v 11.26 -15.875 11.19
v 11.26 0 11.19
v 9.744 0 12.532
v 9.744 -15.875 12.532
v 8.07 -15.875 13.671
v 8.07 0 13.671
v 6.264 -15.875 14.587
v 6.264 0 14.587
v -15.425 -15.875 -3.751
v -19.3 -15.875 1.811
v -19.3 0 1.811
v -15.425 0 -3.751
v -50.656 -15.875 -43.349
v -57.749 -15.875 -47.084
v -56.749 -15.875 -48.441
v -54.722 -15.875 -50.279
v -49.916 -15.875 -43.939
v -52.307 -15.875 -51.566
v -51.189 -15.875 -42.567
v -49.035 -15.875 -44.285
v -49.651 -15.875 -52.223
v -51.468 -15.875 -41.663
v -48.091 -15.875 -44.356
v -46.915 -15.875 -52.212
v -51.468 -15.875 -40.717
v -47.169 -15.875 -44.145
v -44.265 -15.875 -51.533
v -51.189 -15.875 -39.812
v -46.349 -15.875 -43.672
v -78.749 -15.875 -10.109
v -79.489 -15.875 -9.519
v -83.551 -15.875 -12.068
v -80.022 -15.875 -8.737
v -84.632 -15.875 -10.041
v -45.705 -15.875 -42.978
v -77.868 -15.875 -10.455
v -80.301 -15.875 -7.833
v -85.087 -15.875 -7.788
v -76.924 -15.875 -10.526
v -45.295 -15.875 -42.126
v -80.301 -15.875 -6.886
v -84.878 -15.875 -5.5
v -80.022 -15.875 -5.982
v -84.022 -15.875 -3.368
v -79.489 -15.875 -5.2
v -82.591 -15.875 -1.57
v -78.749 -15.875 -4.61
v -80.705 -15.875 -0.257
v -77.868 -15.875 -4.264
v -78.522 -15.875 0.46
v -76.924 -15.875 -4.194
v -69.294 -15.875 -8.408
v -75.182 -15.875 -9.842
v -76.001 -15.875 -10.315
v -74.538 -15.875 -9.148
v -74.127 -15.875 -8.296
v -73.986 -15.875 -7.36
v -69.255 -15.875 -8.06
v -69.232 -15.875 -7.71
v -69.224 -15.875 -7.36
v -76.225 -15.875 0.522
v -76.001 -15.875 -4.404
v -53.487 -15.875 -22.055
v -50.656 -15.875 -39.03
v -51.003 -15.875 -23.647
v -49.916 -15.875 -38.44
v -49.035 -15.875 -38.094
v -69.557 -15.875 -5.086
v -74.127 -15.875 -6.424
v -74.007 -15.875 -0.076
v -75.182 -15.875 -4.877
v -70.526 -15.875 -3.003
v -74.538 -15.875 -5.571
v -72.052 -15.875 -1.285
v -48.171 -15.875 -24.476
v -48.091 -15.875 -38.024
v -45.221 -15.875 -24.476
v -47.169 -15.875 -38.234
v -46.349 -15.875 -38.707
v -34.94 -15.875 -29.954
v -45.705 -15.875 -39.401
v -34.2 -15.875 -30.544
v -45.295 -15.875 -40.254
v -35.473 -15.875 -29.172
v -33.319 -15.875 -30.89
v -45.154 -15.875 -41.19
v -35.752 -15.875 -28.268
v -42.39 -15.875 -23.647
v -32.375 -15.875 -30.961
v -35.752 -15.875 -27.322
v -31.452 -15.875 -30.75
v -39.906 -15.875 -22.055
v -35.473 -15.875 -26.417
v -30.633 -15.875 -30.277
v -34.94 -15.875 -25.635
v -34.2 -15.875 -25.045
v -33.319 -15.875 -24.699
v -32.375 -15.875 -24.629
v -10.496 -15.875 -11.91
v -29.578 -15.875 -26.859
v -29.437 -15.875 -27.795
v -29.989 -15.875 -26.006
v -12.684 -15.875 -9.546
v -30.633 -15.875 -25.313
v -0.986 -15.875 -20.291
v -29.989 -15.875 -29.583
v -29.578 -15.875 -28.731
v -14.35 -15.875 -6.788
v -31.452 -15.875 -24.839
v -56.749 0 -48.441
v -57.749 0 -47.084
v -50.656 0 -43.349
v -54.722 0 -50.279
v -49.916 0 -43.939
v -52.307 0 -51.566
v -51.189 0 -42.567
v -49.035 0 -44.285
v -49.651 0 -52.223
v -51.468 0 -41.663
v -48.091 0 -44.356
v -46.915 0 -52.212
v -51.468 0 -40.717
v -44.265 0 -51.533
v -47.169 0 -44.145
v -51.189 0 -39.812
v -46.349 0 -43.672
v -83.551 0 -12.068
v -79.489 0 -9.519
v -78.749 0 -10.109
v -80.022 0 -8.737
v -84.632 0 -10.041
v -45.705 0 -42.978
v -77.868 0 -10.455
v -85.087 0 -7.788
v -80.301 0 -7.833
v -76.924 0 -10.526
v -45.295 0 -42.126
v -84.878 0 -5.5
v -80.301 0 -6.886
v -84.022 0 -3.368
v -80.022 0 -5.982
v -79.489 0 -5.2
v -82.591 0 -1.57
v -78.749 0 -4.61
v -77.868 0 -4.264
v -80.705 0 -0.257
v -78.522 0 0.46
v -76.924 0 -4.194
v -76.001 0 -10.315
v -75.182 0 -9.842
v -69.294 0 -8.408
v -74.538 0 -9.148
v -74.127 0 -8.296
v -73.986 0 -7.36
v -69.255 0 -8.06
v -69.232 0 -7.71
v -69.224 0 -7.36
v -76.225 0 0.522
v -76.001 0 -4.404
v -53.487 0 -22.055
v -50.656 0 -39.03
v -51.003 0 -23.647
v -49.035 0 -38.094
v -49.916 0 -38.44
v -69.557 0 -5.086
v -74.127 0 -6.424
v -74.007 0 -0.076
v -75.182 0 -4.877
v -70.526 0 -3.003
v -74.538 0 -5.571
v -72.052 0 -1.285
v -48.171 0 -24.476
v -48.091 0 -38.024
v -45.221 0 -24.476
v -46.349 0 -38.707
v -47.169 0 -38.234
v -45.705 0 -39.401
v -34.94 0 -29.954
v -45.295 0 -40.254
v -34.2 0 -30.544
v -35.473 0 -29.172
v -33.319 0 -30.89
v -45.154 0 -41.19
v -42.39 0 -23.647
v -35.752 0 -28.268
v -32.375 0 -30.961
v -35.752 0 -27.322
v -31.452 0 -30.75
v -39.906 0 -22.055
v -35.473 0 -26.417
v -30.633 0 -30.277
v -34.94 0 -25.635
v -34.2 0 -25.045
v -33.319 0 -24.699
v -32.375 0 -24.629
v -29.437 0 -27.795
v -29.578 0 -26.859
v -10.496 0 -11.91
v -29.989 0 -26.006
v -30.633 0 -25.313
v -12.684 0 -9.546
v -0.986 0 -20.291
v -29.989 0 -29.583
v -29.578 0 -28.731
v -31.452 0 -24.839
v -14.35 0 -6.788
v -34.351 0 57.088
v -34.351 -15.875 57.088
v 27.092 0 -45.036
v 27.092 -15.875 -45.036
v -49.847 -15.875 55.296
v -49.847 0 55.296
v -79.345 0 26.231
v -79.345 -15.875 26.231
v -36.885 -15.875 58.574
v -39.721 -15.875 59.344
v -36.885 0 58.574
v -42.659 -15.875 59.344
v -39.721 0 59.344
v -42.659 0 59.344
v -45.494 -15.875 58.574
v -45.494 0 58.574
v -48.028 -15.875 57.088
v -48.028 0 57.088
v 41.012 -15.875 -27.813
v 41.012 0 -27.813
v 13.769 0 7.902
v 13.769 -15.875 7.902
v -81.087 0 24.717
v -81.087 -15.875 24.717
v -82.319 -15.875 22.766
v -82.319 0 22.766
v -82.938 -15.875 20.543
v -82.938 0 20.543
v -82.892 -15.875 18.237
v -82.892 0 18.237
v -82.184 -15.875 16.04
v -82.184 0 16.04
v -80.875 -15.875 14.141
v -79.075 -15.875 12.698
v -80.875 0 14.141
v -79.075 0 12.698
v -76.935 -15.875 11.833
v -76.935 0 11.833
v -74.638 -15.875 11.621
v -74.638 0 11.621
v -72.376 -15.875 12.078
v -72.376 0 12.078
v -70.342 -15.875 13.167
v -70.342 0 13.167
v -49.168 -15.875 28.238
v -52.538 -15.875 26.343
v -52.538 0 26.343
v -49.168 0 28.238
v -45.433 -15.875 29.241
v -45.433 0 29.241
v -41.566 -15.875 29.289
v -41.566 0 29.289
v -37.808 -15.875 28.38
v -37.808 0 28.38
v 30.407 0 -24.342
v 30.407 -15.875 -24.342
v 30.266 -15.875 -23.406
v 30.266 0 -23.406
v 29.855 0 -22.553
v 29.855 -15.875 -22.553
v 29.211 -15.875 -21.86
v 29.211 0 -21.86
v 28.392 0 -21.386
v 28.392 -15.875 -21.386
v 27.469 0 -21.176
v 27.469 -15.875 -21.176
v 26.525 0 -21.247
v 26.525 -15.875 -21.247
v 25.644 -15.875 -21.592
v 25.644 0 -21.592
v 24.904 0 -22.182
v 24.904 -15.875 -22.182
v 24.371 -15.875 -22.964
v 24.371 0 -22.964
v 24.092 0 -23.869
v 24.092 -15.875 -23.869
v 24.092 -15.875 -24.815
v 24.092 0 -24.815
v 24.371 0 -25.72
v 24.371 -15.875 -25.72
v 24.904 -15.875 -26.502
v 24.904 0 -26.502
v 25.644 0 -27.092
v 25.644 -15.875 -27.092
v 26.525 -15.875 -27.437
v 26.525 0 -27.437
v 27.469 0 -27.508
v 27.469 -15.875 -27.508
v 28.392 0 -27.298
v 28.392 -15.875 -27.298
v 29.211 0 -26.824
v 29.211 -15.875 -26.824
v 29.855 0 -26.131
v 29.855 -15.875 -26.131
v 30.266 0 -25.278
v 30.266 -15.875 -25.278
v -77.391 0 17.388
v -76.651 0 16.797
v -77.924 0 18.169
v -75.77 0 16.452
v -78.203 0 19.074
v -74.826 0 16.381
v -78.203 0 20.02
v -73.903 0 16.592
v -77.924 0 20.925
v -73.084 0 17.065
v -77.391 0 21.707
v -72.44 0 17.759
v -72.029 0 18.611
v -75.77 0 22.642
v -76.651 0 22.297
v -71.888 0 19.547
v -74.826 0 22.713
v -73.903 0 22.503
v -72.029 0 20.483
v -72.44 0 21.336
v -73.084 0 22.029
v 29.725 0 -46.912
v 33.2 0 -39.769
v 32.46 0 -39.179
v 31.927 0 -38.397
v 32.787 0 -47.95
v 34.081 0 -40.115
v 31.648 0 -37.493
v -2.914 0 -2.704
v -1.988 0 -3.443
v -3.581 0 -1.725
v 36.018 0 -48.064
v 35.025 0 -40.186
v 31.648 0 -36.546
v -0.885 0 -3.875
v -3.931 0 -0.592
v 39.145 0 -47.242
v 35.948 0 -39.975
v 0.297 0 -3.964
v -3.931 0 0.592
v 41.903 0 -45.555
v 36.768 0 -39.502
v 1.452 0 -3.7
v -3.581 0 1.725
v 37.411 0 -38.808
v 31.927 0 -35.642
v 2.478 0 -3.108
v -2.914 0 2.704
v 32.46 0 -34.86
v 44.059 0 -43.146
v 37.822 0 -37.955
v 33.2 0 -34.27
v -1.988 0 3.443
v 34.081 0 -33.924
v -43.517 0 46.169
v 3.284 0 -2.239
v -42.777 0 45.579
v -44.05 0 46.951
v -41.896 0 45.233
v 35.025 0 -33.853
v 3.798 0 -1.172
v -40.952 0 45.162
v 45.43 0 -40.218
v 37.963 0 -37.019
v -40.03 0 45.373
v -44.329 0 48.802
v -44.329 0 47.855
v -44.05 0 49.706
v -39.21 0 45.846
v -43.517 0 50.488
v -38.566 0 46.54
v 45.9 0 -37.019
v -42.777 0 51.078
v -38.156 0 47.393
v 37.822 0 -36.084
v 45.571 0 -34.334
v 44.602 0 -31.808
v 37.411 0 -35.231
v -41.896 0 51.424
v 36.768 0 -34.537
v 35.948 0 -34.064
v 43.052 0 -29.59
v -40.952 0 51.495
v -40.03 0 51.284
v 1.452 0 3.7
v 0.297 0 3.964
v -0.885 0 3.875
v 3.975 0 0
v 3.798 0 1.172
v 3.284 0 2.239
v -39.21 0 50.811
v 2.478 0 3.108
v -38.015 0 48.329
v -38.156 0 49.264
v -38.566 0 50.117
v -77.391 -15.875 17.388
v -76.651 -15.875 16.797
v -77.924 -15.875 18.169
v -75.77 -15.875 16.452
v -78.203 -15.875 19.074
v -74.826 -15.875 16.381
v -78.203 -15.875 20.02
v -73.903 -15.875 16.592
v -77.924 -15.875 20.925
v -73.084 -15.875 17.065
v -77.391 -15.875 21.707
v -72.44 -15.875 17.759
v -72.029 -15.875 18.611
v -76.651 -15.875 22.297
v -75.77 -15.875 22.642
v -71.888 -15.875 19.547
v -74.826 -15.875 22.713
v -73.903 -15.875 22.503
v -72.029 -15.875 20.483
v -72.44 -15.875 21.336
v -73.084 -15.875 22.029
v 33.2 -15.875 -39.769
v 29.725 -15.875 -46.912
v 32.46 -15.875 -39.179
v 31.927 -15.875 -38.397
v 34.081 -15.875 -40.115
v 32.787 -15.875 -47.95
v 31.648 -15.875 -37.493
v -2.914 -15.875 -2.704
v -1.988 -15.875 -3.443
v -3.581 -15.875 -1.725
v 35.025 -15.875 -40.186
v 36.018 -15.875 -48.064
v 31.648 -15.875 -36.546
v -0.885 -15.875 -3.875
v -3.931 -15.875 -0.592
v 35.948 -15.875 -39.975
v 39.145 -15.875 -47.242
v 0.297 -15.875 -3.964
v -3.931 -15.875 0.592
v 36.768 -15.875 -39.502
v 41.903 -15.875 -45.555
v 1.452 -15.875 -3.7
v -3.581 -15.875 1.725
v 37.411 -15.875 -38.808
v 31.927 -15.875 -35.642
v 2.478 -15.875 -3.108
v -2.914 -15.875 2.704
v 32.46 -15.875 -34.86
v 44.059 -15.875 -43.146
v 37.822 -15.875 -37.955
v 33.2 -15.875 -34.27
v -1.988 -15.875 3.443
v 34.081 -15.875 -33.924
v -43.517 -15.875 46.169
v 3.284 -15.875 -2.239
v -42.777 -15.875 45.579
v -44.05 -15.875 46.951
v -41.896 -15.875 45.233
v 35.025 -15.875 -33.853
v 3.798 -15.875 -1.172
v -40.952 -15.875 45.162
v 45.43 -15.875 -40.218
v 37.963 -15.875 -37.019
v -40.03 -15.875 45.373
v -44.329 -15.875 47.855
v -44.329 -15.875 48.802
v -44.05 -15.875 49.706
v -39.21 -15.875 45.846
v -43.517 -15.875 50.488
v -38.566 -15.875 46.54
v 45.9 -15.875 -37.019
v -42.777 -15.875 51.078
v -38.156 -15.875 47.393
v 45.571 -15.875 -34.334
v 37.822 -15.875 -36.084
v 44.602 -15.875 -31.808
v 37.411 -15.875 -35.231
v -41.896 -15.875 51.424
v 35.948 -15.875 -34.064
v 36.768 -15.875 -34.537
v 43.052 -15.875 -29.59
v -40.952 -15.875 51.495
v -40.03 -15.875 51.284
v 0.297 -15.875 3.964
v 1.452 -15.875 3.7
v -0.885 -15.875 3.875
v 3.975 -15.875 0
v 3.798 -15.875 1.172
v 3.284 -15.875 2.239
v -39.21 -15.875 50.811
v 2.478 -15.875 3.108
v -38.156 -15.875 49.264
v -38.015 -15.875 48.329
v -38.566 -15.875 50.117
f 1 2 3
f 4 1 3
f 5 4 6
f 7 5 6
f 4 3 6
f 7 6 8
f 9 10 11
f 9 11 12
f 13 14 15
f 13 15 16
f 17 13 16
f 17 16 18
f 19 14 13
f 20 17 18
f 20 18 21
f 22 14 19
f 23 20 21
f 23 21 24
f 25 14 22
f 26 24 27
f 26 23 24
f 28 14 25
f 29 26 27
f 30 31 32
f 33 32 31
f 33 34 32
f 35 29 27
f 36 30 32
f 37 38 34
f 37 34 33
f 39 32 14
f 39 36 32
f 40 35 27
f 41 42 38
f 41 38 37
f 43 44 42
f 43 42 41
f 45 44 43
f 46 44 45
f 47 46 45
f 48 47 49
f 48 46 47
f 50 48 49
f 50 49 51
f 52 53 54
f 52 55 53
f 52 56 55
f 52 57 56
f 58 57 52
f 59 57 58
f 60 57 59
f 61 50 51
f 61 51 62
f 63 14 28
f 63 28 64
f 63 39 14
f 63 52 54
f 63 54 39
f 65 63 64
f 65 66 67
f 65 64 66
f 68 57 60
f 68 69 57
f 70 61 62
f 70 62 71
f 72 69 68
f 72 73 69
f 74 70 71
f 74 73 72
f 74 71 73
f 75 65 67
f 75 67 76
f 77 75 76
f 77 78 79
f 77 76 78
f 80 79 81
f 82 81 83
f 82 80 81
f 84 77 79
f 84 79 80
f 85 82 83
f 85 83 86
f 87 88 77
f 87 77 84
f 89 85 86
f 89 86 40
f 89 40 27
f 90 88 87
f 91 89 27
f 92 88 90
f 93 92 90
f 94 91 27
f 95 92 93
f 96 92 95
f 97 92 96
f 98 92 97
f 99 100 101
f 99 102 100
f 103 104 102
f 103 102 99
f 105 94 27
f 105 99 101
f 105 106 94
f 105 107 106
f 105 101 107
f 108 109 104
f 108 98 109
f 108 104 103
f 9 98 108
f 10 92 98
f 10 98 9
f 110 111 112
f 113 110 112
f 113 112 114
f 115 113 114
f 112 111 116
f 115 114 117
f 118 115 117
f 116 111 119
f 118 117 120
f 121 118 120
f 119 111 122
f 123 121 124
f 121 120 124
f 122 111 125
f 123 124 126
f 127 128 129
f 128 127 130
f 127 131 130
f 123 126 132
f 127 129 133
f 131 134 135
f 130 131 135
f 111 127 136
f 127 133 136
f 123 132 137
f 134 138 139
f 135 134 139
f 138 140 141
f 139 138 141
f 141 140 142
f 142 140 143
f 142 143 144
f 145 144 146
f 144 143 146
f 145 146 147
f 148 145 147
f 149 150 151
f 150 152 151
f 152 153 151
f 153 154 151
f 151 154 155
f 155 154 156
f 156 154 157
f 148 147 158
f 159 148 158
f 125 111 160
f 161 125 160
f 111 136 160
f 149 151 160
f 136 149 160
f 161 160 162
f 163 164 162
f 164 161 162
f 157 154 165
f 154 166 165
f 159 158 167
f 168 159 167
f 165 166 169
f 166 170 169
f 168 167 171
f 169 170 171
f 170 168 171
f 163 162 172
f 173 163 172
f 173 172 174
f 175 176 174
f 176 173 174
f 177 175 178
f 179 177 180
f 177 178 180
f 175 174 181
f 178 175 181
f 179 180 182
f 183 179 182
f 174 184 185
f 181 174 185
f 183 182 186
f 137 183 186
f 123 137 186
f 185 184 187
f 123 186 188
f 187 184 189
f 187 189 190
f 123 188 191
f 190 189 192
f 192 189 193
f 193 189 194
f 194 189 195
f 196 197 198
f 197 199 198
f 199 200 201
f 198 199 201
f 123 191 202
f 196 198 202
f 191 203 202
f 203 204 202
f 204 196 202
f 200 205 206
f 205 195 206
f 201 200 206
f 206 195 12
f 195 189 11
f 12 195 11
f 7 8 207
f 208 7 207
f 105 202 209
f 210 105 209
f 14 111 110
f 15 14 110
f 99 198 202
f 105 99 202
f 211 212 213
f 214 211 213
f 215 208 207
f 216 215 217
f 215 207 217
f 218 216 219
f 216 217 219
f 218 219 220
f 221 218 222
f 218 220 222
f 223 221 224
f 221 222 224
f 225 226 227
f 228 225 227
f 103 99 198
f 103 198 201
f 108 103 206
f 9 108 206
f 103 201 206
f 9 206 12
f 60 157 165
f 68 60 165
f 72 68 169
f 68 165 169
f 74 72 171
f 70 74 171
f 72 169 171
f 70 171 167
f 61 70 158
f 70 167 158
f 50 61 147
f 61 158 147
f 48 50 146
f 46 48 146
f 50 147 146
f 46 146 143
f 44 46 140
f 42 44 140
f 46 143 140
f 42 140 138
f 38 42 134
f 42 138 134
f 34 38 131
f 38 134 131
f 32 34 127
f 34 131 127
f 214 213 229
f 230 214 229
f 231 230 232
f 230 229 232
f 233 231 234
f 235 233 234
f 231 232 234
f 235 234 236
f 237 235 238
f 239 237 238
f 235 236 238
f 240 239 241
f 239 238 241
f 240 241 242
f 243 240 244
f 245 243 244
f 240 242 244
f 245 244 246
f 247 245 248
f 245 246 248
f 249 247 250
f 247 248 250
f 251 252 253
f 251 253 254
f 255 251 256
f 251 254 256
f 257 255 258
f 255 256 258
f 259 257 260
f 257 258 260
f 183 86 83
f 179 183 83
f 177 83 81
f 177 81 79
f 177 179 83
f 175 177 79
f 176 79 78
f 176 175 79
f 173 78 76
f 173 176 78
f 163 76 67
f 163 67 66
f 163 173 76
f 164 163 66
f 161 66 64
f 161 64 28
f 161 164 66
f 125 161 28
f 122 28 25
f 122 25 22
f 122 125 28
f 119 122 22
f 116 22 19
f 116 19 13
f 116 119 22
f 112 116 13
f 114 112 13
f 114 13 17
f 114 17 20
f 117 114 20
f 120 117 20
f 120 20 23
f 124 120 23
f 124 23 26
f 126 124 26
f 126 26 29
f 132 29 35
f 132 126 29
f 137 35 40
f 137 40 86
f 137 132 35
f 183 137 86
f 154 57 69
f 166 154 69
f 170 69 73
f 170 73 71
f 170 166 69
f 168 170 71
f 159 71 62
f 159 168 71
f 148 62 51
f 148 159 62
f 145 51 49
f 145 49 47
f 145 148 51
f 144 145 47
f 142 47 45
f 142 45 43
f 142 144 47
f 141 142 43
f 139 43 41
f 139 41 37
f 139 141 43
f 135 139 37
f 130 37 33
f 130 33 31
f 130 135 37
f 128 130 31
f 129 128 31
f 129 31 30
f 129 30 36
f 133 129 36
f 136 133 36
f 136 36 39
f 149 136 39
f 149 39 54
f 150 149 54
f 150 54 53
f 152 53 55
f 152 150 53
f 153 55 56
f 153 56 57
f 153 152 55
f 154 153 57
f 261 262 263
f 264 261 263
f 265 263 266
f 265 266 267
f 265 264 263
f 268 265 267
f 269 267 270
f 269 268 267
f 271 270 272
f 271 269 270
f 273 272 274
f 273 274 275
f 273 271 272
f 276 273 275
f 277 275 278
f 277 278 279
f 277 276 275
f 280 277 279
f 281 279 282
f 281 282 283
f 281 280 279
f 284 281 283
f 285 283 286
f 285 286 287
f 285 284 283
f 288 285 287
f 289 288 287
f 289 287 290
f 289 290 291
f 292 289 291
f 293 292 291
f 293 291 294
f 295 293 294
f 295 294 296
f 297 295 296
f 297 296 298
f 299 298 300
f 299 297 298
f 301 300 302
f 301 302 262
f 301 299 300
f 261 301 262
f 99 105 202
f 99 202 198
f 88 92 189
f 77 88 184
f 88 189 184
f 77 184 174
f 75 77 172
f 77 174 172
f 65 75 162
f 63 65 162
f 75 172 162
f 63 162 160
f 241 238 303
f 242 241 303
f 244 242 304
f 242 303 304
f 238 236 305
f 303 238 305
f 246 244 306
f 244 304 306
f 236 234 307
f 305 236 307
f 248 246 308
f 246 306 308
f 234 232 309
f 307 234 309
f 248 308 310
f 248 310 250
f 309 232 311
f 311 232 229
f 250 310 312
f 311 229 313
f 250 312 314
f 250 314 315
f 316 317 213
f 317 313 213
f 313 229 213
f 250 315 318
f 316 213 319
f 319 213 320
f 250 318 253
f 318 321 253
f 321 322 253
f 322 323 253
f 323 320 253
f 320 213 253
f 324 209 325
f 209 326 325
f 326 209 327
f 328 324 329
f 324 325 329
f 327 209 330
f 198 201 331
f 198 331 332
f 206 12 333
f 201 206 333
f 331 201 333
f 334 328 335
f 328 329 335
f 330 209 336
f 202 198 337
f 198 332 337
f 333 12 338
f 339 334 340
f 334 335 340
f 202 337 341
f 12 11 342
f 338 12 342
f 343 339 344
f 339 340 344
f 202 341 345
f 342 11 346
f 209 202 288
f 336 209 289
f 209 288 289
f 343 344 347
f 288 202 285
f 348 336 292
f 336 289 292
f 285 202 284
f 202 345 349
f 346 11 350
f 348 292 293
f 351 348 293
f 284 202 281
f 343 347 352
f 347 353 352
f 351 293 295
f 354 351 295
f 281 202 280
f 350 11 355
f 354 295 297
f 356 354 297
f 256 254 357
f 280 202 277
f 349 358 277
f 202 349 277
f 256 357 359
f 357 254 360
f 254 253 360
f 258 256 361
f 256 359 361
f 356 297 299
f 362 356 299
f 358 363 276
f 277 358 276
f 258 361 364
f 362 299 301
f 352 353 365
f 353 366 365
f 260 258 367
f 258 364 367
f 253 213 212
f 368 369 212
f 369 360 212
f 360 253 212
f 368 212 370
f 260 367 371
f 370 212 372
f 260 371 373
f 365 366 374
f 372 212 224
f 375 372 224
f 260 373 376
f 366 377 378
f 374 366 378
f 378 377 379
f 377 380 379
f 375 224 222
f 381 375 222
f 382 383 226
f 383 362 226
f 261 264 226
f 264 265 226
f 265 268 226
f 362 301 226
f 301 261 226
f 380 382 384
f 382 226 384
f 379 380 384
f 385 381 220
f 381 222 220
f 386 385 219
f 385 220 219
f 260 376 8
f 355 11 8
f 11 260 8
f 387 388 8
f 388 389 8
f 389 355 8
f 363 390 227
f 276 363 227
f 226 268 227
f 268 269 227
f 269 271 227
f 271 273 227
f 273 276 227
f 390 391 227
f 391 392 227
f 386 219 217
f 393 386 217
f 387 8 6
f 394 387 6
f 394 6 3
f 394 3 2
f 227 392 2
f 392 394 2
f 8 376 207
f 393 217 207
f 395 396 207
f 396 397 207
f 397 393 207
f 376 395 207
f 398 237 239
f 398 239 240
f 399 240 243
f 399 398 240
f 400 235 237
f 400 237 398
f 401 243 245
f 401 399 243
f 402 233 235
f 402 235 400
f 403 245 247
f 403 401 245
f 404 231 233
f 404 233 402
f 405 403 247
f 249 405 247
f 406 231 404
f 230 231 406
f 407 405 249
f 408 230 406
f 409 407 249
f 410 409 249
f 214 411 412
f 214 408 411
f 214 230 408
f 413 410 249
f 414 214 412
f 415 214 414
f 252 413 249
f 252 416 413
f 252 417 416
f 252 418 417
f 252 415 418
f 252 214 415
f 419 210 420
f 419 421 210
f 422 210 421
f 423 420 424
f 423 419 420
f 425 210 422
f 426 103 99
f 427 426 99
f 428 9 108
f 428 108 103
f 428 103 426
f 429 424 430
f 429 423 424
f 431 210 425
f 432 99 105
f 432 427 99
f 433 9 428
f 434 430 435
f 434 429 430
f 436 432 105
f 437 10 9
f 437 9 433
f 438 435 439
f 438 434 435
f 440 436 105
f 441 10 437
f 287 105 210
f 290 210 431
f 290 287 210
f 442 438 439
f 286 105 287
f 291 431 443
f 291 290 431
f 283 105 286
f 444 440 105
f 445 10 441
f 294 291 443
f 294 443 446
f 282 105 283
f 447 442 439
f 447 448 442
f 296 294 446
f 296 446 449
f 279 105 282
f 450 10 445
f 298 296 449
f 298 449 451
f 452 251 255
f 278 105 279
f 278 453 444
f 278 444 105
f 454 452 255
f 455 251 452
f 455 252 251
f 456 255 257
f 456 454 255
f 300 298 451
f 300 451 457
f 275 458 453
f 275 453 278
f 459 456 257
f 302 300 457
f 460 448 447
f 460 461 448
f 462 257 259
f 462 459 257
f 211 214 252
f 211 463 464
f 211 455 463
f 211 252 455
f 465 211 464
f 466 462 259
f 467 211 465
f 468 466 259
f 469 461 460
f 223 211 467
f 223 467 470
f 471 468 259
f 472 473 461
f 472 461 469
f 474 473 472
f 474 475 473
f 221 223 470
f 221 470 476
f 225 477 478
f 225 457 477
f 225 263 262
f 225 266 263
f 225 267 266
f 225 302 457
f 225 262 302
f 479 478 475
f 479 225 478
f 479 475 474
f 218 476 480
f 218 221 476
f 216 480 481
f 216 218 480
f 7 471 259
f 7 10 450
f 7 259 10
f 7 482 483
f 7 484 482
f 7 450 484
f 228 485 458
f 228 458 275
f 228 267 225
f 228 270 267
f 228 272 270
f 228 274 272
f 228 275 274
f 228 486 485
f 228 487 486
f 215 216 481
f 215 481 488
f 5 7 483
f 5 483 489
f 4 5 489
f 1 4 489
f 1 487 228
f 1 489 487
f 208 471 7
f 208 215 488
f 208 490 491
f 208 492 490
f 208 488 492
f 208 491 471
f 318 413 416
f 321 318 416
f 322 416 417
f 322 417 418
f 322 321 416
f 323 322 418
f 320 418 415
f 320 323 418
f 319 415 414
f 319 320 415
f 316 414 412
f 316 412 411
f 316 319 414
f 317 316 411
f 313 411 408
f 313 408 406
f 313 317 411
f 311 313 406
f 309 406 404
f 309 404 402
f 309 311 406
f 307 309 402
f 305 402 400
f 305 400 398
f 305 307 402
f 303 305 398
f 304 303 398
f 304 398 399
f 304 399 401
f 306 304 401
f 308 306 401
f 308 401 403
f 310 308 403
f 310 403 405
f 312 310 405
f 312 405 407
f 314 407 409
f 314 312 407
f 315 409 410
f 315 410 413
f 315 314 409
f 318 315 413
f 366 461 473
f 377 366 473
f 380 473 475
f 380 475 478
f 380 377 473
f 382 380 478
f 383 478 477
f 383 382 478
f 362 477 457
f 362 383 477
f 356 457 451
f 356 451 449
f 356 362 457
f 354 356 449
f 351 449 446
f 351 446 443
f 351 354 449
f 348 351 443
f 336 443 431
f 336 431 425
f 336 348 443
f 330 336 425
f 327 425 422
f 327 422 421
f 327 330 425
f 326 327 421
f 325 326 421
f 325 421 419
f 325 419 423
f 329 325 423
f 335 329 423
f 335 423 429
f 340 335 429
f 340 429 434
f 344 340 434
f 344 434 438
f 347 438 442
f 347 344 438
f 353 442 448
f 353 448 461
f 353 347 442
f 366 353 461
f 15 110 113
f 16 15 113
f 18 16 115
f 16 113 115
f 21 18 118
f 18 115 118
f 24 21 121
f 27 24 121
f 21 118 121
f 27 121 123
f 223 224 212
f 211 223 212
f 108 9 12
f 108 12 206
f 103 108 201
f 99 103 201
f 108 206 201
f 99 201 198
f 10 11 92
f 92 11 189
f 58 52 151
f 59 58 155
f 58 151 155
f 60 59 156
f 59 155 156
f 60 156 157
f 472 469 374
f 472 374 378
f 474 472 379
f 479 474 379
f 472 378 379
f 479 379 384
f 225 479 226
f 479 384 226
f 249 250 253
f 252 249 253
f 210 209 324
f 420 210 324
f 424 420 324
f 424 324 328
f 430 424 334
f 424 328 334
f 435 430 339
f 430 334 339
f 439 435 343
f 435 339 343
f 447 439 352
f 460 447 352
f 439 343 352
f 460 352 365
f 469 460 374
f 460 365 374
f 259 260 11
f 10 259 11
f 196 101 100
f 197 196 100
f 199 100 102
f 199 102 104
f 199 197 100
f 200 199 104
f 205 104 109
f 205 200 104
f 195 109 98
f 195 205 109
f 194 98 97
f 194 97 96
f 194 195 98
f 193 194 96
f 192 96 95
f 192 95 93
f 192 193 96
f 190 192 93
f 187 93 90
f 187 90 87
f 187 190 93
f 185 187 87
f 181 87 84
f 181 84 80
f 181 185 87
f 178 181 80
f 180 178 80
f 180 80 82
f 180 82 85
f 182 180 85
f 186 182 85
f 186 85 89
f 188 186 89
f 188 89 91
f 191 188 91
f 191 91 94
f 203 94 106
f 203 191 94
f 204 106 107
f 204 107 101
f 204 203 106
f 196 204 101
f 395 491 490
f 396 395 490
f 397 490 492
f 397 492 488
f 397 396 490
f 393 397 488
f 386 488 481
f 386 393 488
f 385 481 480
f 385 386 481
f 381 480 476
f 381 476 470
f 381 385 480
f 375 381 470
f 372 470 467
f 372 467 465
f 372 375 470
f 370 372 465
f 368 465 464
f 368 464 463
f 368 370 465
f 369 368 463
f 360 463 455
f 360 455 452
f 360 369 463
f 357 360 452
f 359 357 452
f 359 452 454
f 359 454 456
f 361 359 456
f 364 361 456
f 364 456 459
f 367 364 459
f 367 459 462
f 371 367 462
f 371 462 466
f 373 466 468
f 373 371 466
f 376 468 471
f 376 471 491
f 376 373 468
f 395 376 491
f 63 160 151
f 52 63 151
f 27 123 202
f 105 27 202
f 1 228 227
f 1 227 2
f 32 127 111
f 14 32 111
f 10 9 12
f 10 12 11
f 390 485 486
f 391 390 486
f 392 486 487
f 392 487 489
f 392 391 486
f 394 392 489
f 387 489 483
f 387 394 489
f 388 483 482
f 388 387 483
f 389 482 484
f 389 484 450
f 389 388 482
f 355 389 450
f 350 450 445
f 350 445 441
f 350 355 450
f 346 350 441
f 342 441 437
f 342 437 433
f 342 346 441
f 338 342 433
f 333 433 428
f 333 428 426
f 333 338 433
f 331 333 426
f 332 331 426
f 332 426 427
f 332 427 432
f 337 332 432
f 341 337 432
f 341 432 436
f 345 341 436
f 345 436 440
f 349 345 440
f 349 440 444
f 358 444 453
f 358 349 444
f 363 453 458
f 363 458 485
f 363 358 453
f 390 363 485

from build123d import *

# Parameters (mm, degrees)
F0_R     = 3.175
F1_DEPTH = 15.875
F0_R_2   = 3.9751
F2_DEPTH = 15.875


with BuildPart() as f1:
    # F0 (on Front) → F1 (new body)
    with BuildSketch(Plane.XZ):
        with BuildLine():
            ThreePointArc((-10.4960732024, -11.9099988383), (-13.5875737276, -8.2093523008), (-15.4254200703, -3.7512718716))
            Line((-15.4254200703, -3.7512718716), (-19.3001614593, 1.8110578452))
            Line((-19.3001614593, 1.8110578452), (-39.9055071175, -22.0553158222))
            ThreePointArc((-39.9055071175, -22.0553158222), (-46.6961157411, -24.5811329447), (-53.4867243648, -22.0553158222))
            Line((-53.4867243648, -22.0553158222), (-69.2935079295, -8.4083226244))
            ThreePointArc((-69.2935079295, -8.4083226244), (-75.1878468749, -15.0479298343), (-83.5514512466, -12.0683766096))
            Line((-83.5514512466, -12.0683766096), (-57.7488667293, -47.0843634166))
            ThreePointArc((-57.7488667293, -47.0843634166), (-51.3949849127, -30.5086752982), (-37.2161209875, -41.1897365062))
            ThreePointArc((-37.2161209875, -41.1897365062), (-37.8797093639, -44.9723152736), (-39.7912214837, -48.3031369562))
            Line((-39.7912214837, -48.3031369562), (-0.9861432884, -20.2909336763))
            Line((-0.9861432884, -20.2909336763), (-10.4960732024, -11.9099988383))
        make_face()
        with Locations((-32.6121534423, -27.7948341944)):
            Circle(F0_R, mode=Mode.SUBTRACT)
        with BuildLine():
            ThreePointArc((-83.5514512466, -12.0683766096), (-75.1878468749, -15.0479298343), (-69.2935079295, -8.4083226244))
            ThreePointArc((-69.2935079295, -8.4083226244), (-69.2413484864, -7.8851648917), (-69.2239365418, -7.359701815))
            ThreePointArc((-69.2239365418, -7.359701815), (-79.639658135, 0.1810092911), (-83.5514512466, -12.0683766096))
        make_face()
        with Locations((-77.1614365418, -7.359701815)):
            Circle(F0_R, mode=Mode.SUBTRACT)
        with BuildLine():
            Line((-44.2649080783, -51.5325549635), (-39.7912214837, -48.3031369562))
            ThreePointArc((-39.7912214837, -48.3031369562), (-37.8797093639, -44.9723152736), (-37.2161209875, -41.1897365062))
            ThreePointArc((-37.2161209875, -41.1897365062), (-51.3949849127, -30.5086752982), (-57.7488667293, -47.0843634166))
            Line((-57.7488667293, -47.0843634166), (-56.7488778009, -48.4414212377))
            ThreePointArc((-56.7488778009, -48.4414212377), (-50.9995095335, -51.9764881314), (-44.2649080783, -51.5325549635))
        make_face()
        with Locations((-48.3286209875, -41.1897365062)):
            Circle(F0_R, mode=Mode.SUBTRACT)
    extrude(amount=F1_DEPTH)


with BuildPart() as f2:
    # F0 (on Front) → F2 (new body)
    with BuildSketch(Plane.XZ):
        with BuildLine():
            ThreePointArc((-15.4254200703, -3.7512718716), (-15.601870238, 2.9321101749), (-13.0110959964, 9.0954387455))
            Line((-13.0110959964, 9.0954387455), (-19.3001614593, 1.8110578452))
            Line((-19.3001614593, 1.8110578452), (-15.4254200703, -3.7512718716))
        make_face()
        with BuildLine():
            Line((13.7687512281, 7.9017159288), (11.2603527656, 11.1901778625))
            ThreePointArc((11.2603527656, 11.1901778625), (8.9252814501, 13.1284034078), (6.2640582022, 14.5868845145))
            ThreePointArc((6.2640582022, 14.5868845145), (-4.3496694021, 15.267481819), (-13.0110959964, 9.0954387455))
            ThreePointArc((-13.0110959964, 9.0954387455), (-15.601870238, 2.9321101749), (-15.4254200703, -3.7512718716))
            ThreePointArc((-15.4254200703, -3.7512718716), (-13.5875737276, -8.2093523008), (-10.4960732024, -11.9099988383))
            ThreePointArc((-10.4960732024, -11.9099988383), (-0.7706182381, -15.8562849536), (9.2916789078, -12.8716870718))
            ThreePointArc((9.2916789078, -12.8716870718), (14.1336659728, -7.2287696858), (15.875, 0))
            ThreePointArc((15.875, 0), (15.3394027059, 4.0888078491), (13.7687512281, 7.9017159288))
        make_face()
        Circle(F0_R_2, mode=Mode.SUBTRACT)
        with BuildLine():
            Line((41.0118364793, -27.8134426259), (13.7687512281, 7.9017159288))
            ThreePointArc((13.7687512281, 7.9017159288), (15.3394027059, 4.0888078491), (15.875, 0))
            ThreePointArc((15.875, 0), (14.1336659728, -7.2287696858), (9.2916789078, -12.8716870718))
            Line((9.2916789078, -12.8716870718), (-0.9861432884, -20.2909336763))
            Line((-0.9861432884, -20.2909336763), (27.0920340306, -45.0357400635))
            ThreePointArc((27.0920340306, -45.0357400635), (26.1453854478, -30.0341773035), (41.0118364793, -27.8134426259))
        make_face()
        with Locations((27.231558522, -24.3419895552)):
            Circle(F0_R, mode=Mode.SUBTRACT)
        with BuildLine():
            Line((-0.9861432884, -20.2909336763), (9.2916789078, -12.8716870718))
            ThreePointArc((9.2916789078, -12.8716870718), (-0.7706182381, -15.8562849536), (-10.4960732024, -11.9099988383))
            Line((-10.4960732024, -11.9099988383), (-0.9861432884, -20.2909336763))
        make_face()
        with BuildLine():
            ThreePointArc((-13.0110959964, 9.0954387455), (-4.3496694021, 15.267481819), (6.2640582022, 14.5868845145))
            Line((6.2640582022, 14.5868845145), (-32.129608296, 54.7630388372))
            ThreePointArc((-32.129608296, 54.7630388372), (-30.6027555629, 51.7055264877), (-30.0772365062, 48.3286209875))
            ThreePointArc((-30.0772365062, 48.3286209875), (-44.8835040281, 37.847984664), (-49.8466381249, 55.2960961839))
            Line((-49.8466381249, 55.2960961839), (-79.3452021815, 26.2306461132))
            ThreePointArc((-79.3452021815, 26.2306461132), (-71.254391912, 26.5109371005), (-67.1259022204, 19.5470770559))
            ThreePointArc((-67.1259022204, 19.5470770559), (-67.975255956, 15.9746704742), (-70.3415466386, 13.1667960186))
            Line((-70.3415466386, 13.1667960186), (-52.5381806367, 26.3425358707))
            ThreePointArc((-52.5381806367, 26.3425358707), (-45.4329874517, 29.2405119956), (-37.8079637885, 28.379669413))
            Line((-37.8079637885, 28.379669413), (-19.3001614593, 1.8110578452))
            Line((-19.3001614593, 1.8110578452), (-13.0110959964, 9.0954387455))
        make_face()
        with BuildLine():
            ThreePointArc((-30.0772365062, 48.3286209875), (-30.6027555629, 51.7055264877), (-32.129608296, 54.7630388372))
            Line((-32.129608296, 54.7630388372), (-34.3510617896, 57.0876268883))
            ThreePointArc((-34.3510617896, 57.0876268883), (-41.1897365062, 59.4411209875), (-48.0284112228, 57.0876268883))
            Line((-48.0284112228, 57.0876268883), (-49.8466381249, 55.2960961839))
            ThreePointArc((-49.8466381249, 55.2960961839), (-44.8835040281, 37.847984664), (-30.0772365062, 48.3286209875))
        make_face()
        with Locations((-41.1897365062, 48.3286209875)):
            Circle(F0_R, mode=Mode.SUBTRACT)
        with BuildLine():
            ThreePointArc((-67.1259022204, 19.5470770559), (-71.254391912, 26.5109371005), (-79.3452021815, 26.2306461132))
            ThreePointArc((-79.3452021815, 26.2306461132), (-81.599032034, 15.0426959453), (-70.3415466386, 13.1667960186))
            ThreePointArc((-70.3415466386, 13.1667960186), (-67.975255956, 15.9746704742), (-67.1259022204, 19.5470770559))
        make_face()
        with Locations((-75.0634022204, 19.5470770559)):
            Circle(F0_R, mode=Mode.SUBTRACT)
        with BuildLine():
            ThreePointArc((45.9004296323, -37.0194536953), (44.6024805922, -31.8077125557), (41.0118364793, -27.8134426259))
            ThreePointArc((41.0118364793, -27.8134426259), (26.1453854478, -30.0341773035), (27.0920340306, -45.0357400635))
            ThreePointArc((27.0920340306, -45.0357400635), (39.1449364246, -47.2421807317), (45.9004296323, -37.0194536953))
        make_face()
        with Locations((34.7879296323, -37.0194536953)):
            Circle(F0_R, mode=Mode.SUBTRACT)
    extrude(amount=F2_DEPTH)


solid = Compound([f1.part, f2.part])
